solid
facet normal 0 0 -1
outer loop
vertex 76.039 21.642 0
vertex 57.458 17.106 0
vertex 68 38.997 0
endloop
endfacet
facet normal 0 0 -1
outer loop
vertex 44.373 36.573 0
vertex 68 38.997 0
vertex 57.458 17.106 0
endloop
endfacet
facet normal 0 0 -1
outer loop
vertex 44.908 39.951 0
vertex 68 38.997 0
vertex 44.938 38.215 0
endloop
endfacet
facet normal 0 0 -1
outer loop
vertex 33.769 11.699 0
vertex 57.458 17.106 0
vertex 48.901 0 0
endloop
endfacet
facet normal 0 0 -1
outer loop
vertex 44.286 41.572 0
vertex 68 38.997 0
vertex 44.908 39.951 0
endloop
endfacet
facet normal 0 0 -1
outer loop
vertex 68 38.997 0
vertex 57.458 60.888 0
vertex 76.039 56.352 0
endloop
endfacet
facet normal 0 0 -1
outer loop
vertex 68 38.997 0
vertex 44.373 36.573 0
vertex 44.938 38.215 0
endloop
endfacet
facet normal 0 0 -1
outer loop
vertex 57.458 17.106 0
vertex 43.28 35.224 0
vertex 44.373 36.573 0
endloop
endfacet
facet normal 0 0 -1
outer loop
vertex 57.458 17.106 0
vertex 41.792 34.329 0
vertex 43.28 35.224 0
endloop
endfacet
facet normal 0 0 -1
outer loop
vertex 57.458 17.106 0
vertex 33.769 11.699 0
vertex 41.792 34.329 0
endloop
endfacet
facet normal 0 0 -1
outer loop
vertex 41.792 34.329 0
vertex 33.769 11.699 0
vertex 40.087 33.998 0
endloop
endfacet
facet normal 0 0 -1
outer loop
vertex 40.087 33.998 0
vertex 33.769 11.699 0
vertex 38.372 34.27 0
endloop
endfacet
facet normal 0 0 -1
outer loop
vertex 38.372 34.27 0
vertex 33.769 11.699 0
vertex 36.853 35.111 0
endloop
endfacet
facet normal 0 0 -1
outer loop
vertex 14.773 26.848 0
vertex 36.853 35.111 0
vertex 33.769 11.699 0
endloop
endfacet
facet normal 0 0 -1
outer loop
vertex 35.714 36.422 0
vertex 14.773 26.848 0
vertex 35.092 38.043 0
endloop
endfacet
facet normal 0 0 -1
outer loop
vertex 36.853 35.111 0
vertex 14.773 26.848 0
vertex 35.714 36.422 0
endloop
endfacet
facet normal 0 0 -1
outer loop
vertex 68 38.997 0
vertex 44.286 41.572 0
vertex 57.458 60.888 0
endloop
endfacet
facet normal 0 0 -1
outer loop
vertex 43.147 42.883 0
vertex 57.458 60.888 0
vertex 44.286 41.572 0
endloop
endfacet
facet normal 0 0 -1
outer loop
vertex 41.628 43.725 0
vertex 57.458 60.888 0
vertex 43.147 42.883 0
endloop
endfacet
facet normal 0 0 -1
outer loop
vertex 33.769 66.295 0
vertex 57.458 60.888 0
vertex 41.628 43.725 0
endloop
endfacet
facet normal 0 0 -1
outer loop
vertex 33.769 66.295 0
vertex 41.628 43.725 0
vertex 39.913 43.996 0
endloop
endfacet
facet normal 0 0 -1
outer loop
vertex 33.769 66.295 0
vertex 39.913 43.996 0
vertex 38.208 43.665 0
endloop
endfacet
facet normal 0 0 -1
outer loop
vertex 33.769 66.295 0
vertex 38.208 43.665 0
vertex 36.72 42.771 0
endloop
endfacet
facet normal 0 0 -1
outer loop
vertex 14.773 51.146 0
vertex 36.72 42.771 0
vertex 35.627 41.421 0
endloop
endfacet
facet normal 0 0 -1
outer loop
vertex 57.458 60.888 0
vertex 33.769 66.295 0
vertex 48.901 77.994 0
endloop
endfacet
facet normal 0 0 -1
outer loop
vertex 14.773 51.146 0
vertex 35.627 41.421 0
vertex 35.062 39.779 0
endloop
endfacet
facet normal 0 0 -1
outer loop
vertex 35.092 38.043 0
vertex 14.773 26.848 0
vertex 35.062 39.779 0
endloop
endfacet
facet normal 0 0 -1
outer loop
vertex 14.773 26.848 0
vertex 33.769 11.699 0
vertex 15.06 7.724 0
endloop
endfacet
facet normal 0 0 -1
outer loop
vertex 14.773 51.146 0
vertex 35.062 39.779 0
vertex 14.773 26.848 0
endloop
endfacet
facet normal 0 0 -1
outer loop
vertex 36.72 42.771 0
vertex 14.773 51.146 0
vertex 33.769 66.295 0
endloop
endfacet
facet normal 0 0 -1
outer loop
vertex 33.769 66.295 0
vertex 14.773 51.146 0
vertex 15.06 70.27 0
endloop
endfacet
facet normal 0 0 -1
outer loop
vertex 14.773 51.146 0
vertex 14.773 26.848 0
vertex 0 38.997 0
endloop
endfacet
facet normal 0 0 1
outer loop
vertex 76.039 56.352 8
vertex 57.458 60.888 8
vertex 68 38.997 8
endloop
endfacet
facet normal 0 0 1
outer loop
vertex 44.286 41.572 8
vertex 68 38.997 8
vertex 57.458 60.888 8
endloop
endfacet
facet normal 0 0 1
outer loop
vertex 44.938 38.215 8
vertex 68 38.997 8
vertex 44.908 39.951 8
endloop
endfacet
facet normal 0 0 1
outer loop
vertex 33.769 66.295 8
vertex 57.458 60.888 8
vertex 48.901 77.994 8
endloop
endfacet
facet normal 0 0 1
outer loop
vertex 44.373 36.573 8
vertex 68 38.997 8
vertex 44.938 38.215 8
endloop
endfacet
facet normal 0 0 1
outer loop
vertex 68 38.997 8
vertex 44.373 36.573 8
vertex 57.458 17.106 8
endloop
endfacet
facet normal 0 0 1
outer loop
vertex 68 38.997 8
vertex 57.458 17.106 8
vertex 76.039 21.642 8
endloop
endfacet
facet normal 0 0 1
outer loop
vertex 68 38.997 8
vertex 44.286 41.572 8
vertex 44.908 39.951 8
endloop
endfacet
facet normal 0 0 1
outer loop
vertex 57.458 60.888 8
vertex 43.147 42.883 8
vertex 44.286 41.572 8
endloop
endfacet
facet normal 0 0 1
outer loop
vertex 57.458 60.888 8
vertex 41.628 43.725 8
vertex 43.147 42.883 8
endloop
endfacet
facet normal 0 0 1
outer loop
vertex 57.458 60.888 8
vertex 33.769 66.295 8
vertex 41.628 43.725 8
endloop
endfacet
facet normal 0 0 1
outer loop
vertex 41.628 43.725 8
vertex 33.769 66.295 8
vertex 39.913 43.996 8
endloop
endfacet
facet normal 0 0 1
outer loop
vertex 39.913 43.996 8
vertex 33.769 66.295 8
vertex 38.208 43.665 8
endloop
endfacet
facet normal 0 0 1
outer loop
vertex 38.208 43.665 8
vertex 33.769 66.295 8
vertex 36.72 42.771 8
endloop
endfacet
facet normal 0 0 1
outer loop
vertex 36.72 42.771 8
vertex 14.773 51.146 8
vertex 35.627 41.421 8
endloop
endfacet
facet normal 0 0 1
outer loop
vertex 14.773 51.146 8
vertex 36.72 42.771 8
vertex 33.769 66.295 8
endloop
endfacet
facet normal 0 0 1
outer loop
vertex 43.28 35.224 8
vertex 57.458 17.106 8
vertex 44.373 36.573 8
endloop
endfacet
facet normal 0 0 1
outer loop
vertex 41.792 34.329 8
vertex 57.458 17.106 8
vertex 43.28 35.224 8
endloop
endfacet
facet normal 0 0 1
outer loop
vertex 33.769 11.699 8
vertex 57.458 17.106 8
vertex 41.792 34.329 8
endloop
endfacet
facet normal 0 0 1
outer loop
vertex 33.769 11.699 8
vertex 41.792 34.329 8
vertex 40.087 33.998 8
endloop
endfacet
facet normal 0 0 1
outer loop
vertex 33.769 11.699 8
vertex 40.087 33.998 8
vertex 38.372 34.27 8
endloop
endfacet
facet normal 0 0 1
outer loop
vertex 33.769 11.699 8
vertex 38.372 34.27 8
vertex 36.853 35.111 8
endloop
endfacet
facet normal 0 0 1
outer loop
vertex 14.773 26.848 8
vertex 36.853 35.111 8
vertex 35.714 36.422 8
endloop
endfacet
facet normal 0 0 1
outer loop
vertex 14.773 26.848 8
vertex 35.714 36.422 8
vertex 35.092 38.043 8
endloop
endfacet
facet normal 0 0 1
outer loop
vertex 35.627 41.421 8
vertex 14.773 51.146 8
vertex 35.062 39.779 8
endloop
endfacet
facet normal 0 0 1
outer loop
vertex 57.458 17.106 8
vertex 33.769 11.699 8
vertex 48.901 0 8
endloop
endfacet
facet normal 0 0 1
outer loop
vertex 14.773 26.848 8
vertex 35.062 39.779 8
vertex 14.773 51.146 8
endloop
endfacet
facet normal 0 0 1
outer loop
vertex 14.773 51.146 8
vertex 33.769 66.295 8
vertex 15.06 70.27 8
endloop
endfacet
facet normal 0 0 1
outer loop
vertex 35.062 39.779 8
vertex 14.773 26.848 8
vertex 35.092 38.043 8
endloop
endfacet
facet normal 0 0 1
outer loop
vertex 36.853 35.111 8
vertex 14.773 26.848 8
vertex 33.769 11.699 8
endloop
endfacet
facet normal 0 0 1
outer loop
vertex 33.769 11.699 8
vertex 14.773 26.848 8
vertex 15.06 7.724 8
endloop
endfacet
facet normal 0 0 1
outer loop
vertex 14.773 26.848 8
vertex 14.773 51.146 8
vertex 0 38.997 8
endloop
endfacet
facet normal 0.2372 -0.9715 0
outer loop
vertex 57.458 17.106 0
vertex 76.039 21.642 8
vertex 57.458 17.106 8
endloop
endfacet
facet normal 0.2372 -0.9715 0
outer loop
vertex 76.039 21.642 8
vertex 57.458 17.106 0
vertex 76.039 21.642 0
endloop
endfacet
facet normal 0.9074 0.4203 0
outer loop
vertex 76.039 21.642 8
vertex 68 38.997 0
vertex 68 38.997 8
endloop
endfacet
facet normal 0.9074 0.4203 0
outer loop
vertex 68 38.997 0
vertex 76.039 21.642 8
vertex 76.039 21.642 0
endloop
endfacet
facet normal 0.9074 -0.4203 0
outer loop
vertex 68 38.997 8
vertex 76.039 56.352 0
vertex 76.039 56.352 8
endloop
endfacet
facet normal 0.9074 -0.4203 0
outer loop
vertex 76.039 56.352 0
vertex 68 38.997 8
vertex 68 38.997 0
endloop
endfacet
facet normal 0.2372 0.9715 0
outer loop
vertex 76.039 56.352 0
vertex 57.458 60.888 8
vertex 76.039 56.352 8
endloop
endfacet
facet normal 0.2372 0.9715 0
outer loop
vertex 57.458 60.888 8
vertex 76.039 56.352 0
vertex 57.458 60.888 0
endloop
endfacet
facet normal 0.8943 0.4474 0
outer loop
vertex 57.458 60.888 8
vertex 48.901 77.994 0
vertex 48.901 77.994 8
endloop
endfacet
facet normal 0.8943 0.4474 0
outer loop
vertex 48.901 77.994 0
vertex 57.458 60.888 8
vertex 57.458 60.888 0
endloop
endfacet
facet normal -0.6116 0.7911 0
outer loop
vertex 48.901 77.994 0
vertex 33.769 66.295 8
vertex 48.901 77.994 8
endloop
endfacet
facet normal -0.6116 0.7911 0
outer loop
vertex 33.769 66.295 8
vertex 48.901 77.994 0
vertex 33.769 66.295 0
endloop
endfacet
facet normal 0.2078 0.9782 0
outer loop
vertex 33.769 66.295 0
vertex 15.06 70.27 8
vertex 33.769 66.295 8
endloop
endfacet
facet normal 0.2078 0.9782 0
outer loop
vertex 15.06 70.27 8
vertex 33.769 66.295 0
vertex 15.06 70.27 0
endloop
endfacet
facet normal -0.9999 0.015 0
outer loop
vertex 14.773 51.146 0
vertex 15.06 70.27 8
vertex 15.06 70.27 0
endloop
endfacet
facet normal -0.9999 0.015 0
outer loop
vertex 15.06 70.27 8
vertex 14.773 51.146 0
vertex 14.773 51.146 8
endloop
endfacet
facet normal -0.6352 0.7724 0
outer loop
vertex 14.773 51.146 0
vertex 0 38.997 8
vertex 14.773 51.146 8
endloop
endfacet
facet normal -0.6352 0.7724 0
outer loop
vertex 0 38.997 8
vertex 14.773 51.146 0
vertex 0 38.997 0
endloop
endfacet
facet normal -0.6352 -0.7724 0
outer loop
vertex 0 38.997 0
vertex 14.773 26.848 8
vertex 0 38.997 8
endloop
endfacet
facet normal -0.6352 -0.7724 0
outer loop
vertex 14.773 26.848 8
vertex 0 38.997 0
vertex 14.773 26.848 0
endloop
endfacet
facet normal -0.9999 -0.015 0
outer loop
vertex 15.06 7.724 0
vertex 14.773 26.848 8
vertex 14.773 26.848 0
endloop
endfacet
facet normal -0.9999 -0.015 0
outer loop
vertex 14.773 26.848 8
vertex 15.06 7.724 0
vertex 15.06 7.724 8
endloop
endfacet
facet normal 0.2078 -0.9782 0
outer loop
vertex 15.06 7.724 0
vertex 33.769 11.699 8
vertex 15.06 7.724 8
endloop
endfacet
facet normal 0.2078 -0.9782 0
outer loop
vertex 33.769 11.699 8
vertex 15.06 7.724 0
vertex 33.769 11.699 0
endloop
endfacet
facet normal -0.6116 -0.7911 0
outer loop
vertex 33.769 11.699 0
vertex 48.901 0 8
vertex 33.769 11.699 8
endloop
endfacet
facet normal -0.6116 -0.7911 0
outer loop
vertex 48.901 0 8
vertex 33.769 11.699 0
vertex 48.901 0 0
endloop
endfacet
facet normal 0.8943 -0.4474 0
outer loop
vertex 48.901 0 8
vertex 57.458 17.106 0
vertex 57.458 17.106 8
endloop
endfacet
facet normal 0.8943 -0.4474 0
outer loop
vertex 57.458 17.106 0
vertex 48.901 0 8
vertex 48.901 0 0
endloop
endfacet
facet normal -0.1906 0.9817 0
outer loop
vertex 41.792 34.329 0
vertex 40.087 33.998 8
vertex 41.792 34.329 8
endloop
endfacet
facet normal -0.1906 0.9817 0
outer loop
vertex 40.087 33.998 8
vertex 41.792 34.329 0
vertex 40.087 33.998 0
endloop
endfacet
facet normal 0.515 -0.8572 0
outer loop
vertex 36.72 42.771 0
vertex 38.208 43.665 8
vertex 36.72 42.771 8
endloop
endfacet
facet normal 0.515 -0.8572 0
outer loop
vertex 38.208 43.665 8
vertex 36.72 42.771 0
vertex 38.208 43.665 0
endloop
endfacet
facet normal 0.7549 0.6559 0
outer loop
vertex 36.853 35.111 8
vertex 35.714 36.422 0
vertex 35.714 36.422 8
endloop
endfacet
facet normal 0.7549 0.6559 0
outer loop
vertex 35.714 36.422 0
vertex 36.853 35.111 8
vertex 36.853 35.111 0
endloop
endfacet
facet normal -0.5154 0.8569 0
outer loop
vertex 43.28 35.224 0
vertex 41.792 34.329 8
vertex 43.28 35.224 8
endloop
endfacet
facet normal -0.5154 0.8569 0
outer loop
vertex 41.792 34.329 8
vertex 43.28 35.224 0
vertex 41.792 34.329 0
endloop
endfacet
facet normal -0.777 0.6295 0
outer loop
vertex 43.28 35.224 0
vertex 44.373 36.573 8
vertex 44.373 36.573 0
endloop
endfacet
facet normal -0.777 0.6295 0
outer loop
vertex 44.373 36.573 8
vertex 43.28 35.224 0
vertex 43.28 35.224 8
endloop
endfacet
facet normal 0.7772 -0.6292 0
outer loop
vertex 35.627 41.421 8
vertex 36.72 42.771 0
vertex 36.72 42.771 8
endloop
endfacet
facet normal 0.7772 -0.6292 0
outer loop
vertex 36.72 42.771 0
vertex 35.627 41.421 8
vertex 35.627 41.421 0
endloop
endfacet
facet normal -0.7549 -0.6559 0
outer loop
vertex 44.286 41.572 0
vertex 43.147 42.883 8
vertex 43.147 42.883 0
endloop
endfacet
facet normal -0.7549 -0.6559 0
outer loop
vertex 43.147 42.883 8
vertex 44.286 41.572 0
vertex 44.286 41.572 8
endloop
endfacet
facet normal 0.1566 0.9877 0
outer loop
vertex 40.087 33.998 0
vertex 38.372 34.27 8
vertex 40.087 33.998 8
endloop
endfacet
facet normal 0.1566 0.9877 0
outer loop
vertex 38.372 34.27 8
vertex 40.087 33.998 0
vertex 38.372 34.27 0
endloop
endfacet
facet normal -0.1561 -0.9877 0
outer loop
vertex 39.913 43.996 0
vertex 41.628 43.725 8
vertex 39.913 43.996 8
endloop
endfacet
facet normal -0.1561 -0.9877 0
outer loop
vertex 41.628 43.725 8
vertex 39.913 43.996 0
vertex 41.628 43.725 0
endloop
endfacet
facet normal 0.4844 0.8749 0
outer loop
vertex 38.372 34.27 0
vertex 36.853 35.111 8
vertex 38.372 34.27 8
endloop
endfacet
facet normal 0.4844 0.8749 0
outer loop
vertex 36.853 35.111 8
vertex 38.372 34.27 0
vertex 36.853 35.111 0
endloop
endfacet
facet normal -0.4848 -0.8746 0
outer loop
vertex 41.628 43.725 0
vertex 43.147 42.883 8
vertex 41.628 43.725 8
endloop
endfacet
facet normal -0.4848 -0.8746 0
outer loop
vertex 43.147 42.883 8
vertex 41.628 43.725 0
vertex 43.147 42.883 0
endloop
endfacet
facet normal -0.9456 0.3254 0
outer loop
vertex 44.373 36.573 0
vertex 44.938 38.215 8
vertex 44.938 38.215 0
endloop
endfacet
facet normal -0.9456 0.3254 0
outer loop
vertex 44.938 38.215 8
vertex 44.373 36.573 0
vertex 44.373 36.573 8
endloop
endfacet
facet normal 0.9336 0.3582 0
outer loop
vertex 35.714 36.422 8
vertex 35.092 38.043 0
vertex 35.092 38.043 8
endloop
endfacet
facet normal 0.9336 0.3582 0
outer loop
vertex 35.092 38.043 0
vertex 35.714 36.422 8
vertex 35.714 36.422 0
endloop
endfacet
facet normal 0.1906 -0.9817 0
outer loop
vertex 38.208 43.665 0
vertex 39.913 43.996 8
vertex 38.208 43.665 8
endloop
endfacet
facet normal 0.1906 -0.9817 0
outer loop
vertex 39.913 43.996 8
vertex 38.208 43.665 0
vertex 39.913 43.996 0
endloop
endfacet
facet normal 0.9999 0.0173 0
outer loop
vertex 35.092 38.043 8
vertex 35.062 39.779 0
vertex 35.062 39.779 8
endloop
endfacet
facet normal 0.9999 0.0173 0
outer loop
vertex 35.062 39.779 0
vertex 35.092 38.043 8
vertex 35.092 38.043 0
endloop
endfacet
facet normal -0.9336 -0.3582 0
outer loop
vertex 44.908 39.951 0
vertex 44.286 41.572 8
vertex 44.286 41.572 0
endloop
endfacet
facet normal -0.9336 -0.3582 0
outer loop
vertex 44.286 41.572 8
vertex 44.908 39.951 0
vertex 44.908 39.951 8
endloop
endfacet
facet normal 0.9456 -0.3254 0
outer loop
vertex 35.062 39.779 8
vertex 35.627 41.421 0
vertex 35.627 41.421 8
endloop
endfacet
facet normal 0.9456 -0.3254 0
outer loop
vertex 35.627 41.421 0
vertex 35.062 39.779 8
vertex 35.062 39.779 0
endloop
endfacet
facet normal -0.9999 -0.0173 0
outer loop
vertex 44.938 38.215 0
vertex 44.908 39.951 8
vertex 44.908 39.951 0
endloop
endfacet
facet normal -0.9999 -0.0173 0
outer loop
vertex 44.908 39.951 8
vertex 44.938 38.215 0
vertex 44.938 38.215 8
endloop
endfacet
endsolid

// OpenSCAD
$fn = 32;

// ----------------------------------------------------------------------
// Star wheel: 7-point blunt, R40
// ----------------------------------------------------------------------

// --- parameters (mm) ---
n_points = 7;             // number of points / teeth
r_out = 40;               // tip radius
r_in = 28;                // root radius
bore_r = 5;               // centre bore radius
plate_t = 8;              // plate thickness, Z (extrusion height)
bore_d = 10;              // centre bore diameter

profile = [[0, 38.997], [14.773, 26.848], [15.06, 7.724], [33.769, 11.699], [48.901, 0], [57.458, 17.106], [76.039, 21.642], [68, 38.997], [76.039, 56.352], [57.458, 60.888], [48.901, 77.994], [33.769, 66.295], [15.06, 70.27], [14.773, 51.146]];  // primary outline, 14 points, counter clockwise
void_1 = [[44.908, 39.951], [44.286, 41.572], [43.147, 42.883], [41.628, 43.725], [39.913, 43.996], [38.208, 43.665], [36.72, 42.771], [35.627, 41.421], [35.062, 39.779], [35.092, 38.043], [35.714, 36.422], [36.853, 35.111], [38.372, 34.27], [40.087, 33.998], [41.792, 34.329], [43.28, 35.224], [44.373, 36.573], [44.938, 38.215]];  // centre bore, 18 points

// --- the one profile operation ---
difference() {
  linear_extrude(height = plate_t) polygon(points = profile);
  translate([0, 0, -1])
    linear_extrude(height = plate_t + 2) polygon(points = void_1);
}
